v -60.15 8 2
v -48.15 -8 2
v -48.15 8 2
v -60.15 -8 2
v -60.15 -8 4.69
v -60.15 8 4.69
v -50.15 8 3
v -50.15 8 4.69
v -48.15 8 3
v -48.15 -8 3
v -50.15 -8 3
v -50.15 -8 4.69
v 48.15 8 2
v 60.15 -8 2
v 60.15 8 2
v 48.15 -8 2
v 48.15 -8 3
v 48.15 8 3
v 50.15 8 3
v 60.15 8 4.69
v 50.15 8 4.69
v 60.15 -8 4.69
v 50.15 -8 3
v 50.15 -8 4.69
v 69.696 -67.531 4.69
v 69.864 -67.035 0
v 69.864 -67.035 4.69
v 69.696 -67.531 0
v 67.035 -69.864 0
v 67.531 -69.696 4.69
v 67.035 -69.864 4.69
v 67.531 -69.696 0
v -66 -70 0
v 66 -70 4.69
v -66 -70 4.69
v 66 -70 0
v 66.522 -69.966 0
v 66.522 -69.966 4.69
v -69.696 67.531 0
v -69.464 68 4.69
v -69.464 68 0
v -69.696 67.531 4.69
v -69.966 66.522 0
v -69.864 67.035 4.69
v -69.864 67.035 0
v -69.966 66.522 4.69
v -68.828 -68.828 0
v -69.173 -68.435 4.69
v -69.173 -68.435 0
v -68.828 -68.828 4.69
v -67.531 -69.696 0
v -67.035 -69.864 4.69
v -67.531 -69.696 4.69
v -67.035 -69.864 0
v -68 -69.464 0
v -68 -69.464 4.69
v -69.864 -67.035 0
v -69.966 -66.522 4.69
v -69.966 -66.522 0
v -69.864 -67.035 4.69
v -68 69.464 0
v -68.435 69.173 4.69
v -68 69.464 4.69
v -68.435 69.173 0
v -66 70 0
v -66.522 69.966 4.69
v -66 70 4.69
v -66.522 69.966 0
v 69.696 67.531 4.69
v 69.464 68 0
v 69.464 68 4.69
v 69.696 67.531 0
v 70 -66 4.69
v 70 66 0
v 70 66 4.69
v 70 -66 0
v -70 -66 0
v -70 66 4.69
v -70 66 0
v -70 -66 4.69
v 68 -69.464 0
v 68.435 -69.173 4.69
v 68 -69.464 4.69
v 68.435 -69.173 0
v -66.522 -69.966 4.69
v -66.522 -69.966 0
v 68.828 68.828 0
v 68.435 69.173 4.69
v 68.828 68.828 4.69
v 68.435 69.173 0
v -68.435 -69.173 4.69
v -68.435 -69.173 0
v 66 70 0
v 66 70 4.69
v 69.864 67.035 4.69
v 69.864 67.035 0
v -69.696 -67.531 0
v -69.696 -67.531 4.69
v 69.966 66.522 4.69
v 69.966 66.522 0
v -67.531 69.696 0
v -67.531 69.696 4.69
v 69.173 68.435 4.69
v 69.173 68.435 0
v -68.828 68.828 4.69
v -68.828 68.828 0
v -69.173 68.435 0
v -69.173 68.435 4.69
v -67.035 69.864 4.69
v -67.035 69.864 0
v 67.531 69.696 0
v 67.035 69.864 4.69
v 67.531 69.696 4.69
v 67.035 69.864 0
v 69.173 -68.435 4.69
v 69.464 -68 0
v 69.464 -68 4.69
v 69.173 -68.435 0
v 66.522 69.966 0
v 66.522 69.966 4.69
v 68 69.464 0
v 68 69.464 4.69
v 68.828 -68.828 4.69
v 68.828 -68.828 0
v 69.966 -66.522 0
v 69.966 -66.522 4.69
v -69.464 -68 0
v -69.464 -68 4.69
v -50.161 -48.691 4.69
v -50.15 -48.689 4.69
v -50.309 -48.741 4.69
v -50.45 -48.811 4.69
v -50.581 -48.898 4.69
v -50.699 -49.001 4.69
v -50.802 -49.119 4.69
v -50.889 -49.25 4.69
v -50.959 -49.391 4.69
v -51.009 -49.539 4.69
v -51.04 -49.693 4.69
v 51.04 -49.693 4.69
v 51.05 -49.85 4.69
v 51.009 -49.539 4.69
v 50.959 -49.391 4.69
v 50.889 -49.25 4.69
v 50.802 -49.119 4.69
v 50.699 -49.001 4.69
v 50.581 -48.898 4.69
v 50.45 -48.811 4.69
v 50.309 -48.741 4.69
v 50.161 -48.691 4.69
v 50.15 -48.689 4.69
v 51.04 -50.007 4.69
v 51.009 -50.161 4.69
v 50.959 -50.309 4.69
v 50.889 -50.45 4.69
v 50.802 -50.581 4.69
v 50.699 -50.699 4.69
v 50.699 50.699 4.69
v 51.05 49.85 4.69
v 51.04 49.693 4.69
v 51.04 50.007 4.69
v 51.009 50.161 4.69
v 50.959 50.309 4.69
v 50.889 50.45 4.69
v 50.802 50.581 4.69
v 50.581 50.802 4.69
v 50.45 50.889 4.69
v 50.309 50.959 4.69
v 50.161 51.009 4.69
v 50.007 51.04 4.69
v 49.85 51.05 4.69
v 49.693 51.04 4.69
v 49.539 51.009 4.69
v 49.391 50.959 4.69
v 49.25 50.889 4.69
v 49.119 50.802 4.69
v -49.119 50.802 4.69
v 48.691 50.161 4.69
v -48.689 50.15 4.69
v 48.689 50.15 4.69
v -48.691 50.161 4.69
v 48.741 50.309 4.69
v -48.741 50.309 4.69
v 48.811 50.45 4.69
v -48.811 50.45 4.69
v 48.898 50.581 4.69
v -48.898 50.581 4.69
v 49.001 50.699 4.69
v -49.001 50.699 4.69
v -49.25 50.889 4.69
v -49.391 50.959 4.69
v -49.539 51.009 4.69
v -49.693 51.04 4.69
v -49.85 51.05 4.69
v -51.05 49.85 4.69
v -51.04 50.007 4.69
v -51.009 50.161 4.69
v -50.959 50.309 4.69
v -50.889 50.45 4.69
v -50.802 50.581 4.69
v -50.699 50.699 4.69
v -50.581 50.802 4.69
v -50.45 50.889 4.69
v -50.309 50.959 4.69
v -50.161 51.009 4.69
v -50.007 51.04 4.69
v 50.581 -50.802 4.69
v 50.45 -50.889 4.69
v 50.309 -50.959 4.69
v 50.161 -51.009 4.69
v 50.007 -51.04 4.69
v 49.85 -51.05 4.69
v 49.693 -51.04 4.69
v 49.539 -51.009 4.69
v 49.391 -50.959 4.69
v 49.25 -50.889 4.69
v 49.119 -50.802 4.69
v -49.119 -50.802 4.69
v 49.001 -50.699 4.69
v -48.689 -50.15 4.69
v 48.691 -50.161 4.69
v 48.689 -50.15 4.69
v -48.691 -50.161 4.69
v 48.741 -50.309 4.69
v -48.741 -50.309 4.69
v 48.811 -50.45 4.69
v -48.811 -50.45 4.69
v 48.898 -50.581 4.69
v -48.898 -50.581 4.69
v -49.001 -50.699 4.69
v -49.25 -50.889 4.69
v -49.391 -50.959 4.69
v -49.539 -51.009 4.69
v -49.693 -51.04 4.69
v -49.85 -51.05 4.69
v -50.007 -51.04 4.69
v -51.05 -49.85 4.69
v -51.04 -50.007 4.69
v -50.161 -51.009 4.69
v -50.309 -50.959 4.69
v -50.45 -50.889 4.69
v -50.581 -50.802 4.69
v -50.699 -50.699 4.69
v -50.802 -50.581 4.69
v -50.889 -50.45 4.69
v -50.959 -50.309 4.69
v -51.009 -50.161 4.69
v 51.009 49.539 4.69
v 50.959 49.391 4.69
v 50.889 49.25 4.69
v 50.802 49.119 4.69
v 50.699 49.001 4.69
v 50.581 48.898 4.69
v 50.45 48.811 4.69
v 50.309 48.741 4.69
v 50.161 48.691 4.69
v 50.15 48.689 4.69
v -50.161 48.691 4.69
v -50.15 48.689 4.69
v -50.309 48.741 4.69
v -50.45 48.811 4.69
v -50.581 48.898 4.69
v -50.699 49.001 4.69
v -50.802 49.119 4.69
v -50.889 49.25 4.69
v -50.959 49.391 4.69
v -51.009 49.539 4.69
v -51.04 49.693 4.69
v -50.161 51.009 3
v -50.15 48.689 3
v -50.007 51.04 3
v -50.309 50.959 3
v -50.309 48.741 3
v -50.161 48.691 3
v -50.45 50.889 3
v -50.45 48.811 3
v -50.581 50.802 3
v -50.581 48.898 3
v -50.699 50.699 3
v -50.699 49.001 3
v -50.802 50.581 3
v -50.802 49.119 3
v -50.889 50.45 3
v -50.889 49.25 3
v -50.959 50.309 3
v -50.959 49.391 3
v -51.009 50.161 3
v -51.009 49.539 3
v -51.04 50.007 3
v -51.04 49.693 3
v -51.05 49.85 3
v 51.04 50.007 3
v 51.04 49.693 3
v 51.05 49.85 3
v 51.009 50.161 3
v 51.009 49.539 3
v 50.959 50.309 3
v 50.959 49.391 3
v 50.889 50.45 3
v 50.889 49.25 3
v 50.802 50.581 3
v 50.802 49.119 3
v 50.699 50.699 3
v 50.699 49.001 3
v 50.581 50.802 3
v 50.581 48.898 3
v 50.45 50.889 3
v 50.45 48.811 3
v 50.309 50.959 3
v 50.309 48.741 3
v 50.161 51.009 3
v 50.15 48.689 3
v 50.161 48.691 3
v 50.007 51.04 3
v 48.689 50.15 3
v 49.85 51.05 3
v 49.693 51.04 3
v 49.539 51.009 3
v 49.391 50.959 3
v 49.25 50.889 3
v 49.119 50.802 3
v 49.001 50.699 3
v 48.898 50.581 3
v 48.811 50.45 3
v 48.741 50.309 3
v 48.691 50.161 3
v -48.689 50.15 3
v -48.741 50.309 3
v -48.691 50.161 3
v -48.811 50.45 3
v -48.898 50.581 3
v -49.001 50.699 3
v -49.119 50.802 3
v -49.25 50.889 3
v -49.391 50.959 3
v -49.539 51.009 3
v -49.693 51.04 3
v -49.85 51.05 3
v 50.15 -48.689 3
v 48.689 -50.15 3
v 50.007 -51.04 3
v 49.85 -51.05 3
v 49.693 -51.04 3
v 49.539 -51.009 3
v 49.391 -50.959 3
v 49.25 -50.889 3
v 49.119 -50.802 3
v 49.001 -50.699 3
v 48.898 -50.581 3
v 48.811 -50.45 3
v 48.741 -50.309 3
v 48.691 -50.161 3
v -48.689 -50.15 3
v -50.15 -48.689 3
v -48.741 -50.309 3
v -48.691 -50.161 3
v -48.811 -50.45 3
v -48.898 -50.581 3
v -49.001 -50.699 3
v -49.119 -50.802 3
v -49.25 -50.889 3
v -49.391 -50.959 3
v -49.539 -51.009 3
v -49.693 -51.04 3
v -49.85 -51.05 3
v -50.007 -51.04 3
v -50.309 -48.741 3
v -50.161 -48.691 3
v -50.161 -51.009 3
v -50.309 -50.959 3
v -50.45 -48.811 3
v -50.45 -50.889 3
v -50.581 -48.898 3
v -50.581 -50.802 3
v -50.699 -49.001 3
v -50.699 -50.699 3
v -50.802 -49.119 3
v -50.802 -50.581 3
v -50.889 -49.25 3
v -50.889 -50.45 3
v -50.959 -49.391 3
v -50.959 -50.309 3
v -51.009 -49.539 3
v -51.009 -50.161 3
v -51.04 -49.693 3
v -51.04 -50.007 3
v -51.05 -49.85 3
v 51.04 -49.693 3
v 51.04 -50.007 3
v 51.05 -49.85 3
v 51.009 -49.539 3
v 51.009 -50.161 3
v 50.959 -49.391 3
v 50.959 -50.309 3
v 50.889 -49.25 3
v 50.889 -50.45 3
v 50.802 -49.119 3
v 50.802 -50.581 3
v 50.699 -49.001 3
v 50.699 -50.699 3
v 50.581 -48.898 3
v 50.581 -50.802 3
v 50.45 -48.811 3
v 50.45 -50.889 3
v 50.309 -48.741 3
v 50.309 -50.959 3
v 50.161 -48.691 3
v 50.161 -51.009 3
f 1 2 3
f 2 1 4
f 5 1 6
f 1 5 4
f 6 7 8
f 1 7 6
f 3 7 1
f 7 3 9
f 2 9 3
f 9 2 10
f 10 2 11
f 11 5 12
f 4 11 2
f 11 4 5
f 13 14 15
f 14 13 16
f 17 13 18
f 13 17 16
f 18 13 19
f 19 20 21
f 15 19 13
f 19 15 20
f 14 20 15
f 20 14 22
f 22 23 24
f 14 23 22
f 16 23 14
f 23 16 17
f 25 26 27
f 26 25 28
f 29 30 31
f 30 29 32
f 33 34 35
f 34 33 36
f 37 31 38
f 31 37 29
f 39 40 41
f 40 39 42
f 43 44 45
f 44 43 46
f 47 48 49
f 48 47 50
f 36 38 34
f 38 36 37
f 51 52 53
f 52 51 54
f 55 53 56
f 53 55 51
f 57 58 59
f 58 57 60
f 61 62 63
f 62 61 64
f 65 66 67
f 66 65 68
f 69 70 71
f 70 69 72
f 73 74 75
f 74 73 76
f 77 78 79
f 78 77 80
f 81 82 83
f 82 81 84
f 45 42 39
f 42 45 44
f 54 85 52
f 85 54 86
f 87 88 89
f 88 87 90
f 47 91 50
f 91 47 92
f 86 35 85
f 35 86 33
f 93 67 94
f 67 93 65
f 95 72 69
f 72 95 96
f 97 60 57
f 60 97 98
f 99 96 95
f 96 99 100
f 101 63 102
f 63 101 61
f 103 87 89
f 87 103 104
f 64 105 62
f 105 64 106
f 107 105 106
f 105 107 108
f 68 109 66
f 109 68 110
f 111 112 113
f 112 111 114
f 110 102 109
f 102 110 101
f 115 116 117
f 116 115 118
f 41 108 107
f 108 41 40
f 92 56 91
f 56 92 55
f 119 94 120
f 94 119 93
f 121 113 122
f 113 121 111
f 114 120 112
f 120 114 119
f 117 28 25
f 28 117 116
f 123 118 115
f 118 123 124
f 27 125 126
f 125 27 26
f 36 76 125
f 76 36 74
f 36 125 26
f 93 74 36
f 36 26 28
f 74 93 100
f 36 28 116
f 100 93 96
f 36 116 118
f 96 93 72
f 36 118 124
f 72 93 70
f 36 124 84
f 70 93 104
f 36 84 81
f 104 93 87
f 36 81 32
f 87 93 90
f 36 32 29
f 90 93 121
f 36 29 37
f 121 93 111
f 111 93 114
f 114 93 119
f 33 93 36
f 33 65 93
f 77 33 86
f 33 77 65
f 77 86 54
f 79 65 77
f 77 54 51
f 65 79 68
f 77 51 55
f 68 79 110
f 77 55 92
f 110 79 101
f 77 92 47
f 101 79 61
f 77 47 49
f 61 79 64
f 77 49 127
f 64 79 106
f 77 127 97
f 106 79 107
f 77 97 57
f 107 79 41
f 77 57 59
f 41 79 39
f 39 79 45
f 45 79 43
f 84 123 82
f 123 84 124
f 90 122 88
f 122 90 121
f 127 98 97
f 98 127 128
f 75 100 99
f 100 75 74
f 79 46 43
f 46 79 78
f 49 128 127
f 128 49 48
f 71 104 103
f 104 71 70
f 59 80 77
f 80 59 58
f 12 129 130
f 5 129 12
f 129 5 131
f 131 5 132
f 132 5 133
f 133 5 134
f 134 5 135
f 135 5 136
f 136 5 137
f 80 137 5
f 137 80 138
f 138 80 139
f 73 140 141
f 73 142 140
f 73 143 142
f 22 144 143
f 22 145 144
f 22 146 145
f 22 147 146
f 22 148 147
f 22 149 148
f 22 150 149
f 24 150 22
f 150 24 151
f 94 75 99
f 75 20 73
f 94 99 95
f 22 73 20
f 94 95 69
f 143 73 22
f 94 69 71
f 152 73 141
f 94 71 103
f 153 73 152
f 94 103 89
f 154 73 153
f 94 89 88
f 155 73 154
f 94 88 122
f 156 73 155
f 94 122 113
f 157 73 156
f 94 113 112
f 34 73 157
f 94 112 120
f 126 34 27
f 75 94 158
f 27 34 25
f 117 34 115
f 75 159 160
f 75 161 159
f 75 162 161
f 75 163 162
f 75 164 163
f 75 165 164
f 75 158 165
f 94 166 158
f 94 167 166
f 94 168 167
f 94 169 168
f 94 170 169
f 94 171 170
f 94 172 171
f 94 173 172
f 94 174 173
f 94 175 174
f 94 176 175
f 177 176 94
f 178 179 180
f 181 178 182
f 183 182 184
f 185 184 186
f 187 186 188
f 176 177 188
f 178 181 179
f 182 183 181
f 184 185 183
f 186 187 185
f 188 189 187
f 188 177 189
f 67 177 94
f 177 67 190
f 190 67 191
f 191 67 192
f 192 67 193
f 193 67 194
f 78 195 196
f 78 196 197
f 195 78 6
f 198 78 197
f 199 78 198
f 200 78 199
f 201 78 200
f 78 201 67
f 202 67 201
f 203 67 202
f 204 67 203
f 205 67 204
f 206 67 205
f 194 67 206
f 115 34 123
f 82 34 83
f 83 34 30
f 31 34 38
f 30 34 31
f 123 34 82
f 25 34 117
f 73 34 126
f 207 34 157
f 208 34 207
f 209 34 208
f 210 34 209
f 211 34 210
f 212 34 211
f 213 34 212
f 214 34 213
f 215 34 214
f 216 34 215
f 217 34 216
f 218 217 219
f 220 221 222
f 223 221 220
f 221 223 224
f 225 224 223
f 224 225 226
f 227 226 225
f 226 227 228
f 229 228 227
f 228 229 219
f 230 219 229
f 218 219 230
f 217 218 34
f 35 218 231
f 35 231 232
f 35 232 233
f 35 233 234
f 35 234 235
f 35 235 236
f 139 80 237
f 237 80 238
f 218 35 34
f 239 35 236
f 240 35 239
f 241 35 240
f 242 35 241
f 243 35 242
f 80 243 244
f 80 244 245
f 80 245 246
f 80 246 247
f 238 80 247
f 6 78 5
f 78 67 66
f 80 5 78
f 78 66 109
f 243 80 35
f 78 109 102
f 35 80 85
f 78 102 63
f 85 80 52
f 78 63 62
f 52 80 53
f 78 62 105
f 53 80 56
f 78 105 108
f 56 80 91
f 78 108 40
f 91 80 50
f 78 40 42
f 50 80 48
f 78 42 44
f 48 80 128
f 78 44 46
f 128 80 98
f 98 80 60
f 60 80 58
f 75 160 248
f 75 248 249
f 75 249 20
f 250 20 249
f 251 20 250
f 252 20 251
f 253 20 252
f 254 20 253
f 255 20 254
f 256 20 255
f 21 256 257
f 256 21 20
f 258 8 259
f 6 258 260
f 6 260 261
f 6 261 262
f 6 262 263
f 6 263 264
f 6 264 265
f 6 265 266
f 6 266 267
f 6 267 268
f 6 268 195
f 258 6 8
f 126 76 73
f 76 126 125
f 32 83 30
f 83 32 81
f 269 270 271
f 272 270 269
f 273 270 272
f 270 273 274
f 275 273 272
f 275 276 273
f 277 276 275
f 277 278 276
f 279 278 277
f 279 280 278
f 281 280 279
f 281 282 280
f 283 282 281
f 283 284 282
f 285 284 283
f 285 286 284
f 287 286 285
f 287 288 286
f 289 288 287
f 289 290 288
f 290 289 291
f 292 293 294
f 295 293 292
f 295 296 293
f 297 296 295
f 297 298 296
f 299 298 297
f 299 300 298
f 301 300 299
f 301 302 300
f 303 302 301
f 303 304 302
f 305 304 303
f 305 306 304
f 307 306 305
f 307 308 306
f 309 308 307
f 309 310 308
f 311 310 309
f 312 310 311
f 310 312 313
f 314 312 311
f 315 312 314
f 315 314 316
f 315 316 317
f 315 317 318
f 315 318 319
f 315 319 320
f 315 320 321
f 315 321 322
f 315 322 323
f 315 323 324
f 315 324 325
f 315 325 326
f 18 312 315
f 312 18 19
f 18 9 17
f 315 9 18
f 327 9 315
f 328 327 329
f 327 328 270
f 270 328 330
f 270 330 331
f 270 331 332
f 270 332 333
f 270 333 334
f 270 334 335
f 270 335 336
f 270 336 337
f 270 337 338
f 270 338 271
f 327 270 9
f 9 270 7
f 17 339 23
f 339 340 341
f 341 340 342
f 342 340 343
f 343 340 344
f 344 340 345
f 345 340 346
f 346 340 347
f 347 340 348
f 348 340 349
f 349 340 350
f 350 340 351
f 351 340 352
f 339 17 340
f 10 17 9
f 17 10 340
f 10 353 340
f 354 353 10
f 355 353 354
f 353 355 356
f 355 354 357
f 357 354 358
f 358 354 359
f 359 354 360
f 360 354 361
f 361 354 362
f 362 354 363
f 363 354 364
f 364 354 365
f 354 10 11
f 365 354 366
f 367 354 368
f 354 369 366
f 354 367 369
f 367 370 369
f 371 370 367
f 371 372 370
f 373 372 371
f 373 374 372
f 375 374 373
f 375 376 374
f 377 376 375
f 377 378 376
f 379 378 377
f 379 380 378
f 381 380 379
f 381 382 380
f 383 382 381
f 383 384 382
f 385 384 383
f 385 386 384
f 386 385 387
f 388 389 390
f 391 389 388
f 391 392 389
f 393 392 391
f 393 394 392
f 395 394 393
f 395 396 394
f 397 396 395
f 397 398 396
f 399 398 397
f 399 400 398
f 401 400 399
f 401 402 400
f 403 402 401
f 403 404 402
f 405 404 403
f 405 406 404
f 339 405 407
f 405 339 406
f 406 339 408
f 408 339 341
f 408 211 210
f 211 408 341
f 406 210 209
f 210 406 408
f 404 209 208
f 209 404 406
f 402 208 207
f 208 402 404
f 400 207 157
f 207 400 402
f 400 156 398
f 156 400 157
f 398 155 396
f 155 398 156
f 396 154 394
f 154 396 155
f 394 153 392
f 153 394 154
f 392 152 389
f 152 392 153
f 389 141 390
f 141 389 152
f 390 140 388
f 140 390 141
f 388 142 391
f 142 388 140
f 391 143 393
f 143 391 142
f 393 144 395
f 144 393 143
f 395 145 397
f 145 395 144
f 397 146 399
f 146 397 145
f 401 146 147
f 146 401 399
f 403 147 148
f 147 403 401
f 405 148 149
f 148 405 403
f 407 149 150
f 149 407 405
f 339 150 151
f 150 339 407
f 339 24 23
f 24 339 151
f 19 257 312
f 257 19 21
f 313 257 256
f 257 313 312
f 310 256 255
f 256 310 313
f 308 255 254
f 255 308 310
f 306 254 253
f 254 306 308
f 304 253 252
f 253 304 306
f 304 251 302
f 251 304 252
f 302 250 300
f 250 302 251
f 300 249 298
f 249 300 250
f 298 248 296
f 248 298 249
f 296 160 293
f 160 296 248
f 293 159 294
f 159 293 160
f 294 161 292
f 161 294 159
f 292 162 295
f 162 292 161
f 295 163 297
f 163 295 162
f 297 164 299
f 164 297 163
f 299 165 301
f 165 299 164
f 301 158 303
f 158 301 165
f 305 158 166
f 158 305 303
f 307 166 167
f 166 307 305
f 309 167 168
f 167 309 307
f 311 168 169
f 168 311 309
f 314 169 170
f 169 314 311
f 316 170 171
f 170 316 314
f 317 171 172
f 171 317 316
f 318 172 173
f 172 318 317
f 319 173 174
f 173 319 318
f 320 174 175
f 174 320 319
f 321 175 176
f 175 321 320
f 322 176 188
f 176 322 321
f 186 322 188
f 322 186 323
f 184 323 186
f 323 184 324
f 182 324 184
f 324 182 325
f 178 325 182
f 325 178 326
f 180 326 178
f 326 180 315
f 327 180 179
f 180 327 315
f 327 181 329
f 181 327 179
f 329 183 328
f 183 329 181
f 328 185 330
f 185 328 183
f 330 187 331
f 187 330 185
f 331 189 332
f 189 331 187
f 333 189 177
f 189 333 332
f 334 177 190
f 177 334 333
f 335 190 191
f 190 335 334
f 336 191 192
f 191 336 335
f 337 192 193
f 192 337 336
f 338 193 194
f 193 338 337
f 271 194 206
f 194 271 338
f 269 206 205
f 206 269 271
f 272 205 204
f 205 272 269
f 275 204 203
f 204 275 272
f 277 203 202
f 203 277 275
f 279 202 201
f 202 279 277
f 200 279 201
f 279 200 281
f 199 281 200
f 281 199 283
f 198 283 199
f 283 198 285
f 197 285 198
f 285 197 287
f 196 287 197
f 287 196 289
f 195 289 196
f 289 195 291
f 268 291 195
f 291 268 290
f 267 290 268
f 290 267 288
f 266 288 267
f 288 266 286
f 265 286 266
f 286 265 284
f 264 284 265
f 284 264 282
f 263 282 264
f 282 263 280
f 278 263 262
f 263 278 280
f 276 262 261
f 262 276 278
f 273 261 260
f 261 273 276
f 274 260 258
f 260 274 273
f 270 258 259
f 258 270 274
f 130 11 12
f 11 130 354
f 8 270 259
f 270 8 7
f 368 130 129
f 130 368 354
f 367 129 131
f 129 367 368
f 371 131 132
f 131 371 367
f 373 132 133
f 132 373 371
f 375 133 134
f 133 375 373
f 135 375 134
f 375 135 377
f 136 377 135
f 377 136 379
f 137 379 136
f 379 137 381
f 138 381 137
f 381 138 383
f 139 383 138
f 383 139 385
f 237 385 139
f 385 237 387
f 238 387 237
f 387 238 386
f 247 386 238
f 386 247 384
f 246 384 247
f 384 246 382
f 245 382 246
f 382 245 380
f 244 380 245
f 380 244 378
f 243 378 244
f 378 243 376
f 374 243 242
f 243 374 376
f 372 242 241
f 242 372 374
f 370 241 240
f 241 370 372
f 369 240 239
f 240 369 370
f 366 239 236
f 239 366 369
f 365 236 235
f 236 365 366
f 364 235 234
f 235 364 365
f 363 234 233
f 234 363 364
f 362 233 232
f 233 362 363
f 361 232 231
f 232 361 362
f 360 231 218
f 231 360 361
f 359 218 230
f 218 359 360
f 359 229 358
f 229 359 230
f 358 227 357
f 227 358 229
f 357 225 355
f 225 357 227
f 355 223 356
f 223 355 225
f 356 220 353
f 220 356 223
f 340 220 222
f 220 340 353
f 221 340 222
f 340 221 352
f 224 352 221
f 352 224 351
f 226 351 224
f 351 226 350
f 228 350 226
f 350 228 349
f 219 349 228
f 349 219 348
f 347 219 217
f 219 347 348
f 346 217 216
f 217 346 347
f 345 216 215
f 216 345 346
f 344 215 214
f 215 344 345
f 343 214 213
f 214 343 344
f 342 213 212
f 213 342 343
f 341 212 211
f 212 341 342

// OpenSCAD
// Stencil jig for the car radio main board rev 0.6 (100 x 100 mm, 1.6 mm).
// The board and the same-size frameless stencil drop into one pocket, so their edges line up.
pcb       = 100;   // board (and stencil) size
clr       = 0.15;  // pocket clearance per side
pcb_t     = 1.60;  // board thickness
stencil_t = 0.12;  // stencil thickness
depth     = pcb_t + stencil_t - 0.03;  // stencil ends up a hair above the surround
floor_t   = 3;     // floor under the board
outer     = 140;   // jig size
relief    = 1.2;   // corner relief radius, so a square-cornered stencil fits too
notch_w   = 16;    // finger notches left and right
notch_l   = 10;
$fn = 48;

p = pcb + 2*clr;
difference() {
  linear_extrude(floor_t + depth) offset(4) square(outer - 8, center = true);
  translate([0, 0, floor_t]) linear_extrude(depth + 1) union() {
    square(p, center = true);
    for (sx = [-1, 1], sy = [-1, 1]) translate([sx*(p/2 - 0.3), sy*(p/2 - 0.3)]) circle(relief);
  }
  for (sx = [-1, 1])
    translate([sx*(p/2 + notch_l/2 - 1), 0, floor_t - 1])
      linear_extrude(depth + 2) square([notch_l + 2, notch_w], center = true);
}
